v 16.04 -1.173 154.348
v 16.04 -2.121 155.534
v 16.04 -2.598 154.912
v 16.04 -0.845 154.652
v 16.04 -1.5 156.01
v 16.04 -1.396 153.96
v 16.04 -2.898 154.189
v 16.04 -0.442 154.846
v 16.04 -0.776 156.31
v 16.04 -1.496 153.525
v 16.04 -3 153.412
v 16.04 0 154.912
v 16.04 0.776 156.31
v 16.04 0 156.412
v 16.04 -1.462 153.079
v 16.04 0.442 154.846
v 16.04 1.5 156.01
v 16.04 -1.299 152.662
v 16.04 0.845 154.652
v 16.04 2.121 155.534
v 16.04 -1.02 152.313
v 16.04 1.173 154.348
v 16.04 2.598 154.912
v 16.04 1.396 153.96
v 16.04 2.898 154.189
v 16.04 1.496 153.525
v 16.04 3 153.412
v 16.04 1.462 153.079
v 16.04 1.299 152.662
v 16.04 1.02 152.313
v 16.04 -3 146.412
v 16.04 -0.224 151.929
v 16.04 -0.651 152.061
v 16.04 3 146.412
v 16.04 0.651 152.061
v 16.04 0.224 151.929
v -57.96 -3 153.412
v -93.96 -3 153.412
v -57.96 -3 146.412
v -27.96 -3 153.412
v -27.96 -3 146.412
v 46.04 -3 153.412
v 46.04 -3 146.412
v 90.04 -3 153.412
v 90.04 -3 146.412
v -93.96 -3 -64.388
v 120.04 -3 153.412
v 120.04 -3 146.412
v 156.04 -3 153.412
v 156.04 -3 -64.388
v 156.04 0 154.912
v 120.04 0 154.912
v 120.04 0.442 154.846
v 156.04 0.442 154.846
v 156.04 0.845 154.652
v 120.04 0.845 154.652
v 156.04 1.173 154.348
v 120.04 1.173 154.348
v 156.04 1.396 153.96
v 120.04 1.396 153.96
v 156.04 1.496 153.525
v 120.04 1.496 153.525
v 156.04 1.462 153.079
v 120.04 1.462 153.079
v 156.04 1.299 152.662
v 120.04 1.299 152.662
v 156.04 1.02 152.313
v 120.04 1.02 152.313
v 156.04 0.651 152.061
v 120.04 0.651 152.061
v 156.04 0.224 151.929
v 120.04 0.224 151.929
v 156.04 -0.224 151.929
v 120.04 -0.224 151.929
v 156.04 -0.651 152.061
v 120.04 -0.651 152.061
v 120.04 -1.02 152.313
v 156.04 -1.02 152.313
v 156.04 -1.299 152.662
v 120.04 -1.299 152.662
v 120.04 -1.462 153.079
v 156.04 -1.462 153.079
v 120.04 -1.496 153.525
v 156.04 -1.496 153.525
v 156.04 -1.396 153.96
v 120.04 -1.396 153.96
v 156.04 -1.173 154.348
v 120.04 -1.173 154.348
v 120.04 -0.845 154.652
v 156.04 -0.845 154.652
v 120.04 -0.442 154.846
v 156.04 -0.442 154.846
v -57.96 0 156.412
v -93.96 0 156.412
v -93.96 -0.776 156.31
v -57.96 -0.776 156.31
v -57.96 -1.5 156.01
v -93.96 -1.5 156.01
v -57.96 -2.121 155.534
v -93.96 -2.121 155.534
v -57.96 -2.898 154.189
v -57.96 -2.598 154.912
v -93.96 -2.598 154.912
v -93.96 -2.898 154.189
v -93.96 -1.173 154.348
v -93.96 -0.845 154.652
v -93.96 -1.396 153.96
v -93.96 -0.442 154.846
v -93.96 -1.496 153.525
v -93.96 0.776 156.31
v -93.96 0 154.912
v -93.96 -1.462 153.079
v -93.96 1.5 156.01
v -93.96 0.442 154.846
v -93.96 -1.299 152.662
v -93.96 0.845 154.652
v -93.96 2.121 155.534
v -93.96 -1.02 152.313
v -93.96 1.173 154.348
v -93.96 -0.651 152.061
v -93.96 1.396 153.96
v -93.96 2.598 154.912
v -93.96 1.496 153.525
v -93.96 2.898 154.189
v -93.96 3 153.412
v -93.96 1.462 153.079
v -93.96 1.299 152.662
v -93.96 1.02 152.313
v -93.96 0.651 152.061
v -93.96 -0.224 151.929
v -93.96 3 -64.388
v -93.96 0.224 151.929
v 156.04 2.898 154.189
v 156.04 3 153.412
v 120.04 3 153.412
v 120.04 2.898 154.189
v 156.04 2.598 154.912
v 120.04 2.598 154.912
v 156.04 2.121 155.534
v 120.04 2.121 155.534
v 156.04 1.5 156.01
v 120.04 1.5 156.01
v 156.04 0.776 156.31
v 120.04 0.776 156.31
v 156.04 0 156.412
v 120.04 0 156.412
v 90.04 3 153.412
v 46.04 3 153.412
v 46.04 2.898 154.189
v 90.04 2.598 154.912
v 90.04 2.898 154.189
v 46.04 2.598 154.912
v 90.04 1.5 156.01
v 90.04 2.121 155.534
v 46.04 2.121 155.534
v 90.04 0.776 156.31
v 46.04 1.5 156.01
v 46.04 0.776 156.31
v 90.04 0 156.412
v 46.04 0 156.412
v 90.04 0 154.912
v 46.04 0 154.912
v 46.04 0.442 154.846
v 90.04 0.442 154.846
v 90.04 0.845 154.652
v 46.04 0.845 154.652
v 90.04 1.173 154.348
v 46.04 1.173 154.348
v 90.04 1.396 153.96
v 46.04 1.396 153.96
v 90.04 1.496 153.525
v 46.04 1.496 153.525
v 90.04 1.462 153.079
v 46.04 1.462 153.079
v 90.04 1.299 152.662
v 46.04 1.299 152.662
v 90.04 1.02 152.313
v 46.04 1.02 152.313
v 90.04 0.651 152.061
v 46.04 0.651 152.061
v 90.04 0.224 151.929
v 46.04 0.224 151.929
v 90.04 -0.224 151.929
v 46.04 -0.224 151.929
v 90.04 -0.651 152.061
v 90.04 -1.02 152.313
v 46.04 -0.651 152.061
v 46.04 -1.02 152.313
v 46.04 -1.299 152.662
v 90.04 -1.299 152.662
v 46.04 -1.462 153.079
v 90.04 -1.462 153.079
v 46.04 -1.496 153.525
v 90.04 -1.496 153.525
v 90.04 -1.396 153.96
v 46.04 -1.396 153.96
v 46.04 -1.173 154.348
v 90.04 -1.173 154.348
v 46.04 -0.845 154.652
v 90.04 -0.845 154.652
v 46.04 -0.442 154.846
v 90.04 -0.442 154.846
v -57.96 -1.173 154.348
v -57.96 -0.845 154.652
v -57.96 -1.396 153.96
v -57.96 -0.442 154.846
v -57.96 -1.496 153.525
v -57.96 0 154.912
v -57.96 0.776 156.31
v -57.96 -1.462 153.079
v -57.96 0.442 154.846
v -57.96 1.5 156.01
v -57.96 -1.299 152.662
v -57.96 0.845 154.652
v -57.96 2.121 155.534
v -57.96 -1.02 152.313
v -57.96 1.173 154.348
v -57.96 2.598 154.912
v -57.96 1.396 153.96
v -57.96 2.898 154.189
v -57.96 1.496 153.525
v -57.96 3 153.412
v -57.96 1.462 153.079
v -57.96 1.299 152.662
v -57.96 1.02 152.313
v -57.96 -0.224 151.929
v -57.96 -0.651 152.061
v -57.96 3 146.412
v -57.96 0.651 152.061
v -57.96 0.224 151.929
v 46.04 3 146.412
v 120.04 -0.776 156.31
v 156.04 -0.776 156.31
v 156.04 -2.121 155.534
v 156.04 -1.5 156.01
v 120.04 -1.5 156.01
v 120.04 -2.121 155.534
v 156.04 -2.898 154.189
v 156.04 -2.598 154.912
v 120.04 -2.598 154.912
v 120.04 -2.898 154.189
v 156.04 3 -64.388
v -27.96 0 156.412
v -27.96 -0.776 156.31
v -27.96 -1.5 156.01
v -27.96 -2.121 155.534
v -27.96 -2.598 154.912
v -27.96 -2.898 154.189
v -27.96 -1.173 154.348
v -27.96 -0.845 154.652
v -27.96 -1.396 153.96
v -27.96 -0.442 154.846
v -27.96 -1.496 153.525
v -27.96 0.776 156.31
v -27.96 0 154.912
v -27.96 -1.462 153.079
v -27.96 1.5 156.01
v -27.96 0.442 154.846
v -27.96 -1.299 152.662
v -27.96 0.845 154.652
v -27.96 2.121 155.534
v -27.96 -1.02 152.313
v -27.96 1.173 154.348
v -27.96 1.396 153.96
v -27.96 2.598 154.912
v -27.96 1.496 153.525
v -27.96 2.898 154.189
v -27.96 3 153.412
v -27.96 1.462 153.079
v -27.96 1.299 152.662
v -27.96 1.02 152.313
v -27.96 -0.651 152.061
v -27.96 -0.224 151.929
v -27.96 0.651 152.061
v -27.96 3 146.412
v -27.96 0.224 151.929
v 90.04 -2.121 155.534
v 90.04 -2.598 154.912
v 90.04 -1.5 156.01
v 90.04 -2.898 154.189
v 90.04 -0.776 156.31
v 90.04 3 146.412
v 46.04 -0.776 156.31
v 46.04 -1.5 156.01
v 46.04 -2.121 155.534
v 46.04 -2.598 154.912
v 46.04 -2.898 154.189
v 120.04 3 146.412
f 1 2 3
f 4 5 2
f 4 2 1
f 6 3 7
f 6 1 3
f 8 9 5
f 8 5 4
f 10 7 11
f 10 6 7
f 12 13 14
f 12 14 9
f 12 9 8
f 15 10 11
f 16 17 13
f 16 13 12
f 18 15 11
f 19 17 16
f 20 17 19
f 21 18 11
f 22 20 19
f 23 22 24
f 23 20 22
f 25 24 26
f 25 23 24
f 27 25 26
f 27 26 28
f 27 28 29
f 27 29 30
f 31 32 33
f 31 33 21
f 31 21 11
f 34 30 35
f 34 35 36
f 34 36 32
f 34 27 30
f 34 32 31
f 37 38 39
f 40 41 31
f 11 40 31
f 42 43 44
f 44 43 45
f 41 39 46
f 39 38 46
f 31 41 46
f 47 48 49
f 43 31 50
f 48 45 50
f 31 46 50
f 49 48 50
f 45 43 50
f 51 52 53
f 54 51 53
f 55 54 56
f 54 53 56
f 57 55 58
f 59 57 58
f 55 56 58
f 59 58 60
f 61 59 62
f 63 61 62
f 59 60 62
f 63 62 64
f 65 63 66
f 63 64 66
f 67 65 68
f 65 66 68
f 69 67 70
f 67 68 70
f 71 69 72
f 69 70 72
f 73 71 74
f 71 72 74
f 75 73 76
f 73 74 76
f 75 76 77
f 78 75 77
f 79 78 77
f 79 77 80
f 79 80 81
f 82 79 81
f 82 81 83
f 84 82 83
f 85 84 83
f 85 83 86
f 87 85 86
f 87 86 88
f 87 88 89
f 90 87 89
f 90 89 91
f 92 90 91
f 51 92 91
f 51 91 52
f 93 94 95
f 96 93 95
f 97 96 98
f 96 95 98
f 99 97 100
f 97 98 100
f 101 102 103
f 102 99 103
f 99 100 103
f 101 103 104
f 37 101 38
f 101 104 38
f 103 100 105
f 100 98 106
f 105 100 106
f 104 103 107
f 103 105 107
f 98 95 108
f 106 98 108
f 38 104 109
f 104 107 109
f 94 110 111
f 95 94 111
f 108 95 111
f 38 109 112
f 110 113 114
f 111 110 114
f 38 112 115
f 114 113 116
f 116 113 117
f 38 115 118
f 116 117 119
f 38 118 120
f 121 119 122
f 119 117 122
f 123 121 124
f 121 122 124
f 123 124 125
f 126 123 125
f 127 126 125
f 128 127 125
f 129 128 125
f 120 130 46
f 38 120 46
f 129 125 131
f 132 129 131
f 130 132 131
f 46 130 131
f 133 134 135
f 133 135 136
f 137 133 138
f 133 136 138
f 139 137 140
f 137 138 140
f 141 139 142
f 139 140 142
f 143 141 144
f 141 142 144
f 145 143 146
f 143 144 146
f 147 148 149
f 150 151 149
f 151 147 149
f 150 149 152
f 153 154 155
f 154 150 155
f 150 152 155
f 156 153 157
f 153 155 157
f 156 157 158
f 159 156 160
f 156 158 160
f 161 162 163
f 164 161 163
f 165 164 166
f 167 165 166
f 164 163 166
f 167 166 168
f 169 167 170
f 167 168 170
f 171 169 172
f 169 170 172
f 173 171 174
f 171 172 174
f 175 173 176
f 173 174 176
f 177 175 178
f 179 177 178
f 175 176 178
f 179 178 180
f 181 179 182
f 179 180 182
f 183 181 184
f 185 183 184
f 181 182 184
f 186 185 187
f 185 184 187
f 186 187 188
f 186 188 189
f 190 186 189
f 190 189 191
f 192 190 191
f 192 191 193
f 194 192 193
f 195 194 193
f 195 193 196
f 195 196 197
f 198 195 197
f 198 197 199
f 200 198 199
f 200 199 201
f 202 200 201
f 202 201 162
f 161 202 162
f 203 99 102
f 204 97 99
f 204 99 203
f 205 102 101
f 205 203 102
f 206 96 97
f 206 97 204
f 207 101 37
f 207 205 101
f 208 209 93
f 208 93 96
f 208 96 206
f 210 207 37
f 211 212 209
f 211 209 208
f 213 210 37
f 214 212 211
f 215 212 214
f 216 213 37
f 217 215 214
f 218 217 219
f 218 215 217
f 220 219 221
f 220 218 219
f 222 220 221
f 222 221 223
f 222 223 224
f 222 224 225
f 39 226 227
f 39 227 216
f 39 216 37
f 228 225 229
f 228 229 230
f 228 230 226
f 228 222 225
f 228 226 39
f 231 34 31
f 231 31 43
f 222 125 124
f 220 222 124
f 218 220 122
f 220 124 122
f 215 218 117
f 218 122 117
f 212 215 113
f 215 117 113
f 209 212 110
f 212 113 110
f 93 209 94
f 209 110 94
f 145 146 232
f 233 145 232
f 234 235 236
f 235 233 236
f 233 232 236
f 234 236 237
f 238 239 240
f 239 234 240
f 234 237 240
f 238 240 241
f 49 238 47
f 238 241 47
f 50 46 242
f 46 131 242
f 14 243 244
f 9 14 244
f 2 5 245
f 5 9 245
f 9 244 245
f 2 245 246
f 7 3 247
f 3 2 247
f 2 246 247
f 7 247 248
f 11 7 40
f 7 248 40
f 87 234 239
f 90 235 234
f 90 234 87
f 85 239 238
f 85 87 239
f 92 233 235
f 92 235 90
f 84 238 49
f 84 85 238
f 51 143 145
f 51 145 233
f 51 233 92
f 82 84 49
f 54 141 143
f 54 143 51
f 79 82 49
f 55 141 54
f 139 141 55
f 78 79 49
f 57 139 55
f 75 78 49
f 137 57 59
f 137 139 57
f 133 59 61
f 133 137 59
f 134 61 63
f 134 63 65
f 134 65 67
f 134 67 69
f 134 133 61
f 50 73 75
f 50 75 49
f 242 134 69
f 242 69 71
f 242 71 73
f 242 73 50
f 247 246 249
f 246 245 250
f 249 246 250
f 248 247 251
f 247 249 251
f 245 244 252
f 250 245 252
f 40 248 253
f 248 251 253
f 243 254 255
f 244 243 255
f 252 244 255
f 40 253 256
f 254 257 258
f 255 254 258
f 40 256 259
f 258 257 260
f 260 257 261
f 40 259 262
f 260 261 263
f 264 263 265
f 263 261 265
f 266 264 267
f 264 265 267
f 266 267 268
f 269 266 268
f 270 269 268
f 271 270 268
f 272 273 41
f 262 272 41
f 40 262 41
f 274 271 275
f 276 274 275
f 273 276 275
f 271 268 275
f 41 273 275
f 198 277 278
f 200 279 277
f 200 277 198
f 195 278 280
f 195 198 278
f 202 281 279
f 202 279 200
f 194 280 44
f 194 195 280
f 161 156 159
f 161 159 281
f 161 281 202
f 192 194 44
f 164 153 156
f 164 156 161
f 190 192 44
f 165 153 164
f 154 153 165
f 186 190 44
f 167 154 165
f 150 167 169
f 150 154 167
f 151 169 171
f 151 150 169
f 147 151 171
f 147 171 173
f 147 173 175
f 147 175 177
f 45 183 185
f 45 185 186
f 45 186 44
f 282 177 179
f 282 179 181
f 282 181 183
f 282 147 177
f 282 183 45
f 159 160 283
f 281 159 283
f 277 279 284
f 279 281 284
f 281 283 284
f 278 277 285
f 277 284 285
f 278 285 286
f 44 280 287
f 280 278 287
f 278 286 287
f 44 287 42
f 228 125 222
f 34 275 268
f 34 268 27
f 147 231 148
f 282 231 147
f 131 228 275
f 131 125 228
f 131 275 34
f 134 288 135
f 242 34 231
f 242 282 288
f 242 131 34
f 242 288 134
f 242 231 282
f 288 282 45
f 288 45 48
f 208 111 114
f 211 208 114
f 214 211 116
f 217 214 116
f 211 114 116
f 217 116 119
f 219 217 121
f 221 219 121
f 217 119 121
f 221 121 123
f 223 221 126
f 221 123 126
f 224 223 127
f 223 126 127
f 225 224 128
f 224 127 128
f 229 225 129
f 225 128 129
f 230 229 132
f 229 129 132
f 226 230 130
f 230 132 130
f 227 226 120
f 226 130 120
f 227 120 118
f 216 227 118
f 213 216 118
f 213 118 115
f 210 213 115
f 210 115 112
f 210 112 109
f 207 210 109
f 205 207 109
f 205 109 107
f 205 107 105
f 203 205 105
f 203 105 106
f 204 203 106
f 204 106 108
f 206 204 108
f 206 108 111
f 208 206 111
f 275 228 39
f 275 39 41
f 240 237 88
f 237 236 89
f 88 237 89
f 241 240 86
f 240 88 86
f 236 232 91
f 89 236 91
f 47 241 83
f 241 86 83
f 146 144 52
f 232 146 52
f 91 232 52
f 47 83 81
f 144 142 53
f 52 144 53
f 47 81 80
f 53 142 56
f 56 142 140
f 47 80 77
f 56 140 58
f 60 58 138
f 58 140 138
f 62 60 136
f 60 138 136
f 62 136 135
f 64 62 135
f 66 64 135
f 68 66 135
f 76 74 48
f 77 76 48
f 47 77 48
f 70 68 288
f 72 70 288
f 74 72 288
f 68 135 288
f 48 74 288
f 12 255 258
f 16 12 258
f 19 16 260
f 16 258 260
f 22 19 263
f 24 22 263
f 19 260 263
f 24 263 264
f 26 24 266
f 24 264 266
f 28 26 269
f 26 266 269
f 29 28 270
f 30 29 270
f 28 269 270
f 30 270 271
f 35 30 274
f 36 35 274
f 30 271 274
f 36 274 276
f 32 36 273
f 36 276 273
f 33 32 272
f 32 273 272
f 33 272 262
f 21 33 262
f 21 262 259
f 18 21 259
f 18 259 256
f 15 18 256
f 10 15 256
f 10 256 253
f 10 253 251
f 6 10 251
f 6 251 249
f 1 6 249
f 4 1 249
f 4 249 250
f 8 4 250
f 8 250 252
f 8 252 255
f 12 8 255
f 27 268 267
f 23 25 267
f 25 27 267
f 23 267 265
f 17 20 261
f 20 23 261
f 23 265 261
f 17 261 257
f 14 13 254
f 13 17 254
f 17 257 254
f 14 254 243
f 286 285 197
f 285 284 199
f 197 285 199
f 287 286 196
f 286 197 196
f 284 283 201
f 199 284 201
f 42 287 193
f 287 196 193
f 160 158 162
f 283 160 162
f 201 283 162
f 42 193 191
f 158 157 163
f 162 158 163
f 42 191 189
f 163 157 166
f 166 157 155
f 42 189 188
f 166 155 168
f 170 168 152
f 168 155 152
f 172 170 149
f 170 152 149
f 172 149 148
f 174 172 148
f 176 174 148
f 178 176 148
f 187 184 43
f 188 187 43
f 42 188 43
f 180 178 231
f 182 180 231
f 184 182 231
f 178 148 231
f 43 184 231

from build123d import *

# Parameters (mm, degrees)
SKETCH_1_W          = 250
SKETCH_1_H          = 220.8
EXTRUDE_1_DEPTH     = 3
CUT_EXTRUDE_1_REACH = 223.019
SKETCH_2_W          = 30
SKETCH_2_H          = 10
SKETCH_3_R          = 1.5
CUT_EXTRUDE_2_DEPTH = 295.913282021


with BuildPart() as part:
    # 草图1 → 凸台-拉伸1 (new, symmetric)
    with BuildSketch(Plane(origin=(0, 0, 0), x_dir=(1, 0, 0), z_dir=(0, 1, 0))):
        with Locations((31.040268456, -46.012416107)):
            Rectangle(SKETCH_1_W, SKETCH_1_H)
    extrude(amount=EXTRUDE_1_DEPTH, both=True)

    # 草图2 → 切除-拉伸1 (cut, up to next)
    with BuildSketch(Plane(origin=(0, 3, 0), x_dir=(1, 0, 0), z_dir=(0, 1, 0)), mode=Mode.PRIVATE) as cut_extrude_1_sk1:
        with Locations((-42.959731544, -151.412416107)):
            Rectangle(SKETCH_2_W, SKETCH_2_H)
    cut_extrude_1_tool1 = extrude(cut_extrude_1_sk1.sketch, amount=-CUT_EXTRUDE_1_REACH, mode=Mode.PRIVATE) & part.part
    # 草图2 → 切除-拉伸1 (cut, up to next)
    with BuildSketch(Plane(origin=(0, 3, 0), x_dir=(1, 0, 0), z_dir=(0, 1, 0)), mode=Mode.PRIVATE) as cut_extrude_1_sk2:
        with Locations((31.040268456, -151.412416107)):
            Rectangle(SKETCH_2_W, SKETCH_2_H)
    cut_extrude_1_tool2 = extrude(cut_extrude_1_sk2.sketch, amount=-CUT_EXTRUDE_1_REACH, mode=Mode.PRIVATE) & part.part
    # 草图2 → 切除-拉伸1 (cut, up to next)
    with BuildSketch(Plane(origin=(0, 3, 0), x_dir=(1, 0, 0), z_dir=(0, 1, 0)), mode=Mode.PRIVATE) as cut_extrude_1_sk3:
        with Locations((105.040268456, -151.412416107)):
            Rectangle(SKETCH_2_W, SKETCH_2_H)
    cut_extrude_1_tool3 = extrude(cut_extrude_1_sk3.sketch, amount=-CUT_EXTRUDE_1_REACH, mode=Mode.PRIVATE) & part.part
    add(cut_extrude_1_tool1.solids().sort_by_distance((-42.959732, 3, 151.412416))[0], mode=Mode.SUBTRACT)
    add(cut_extrude_1_tool2.solids().sort_by_distance((31.040268, 3, 151.412416))[0], mode=Mode.SUBTRACT)
    add(cut_extrude_1_tool3.solids().sort_by_distance((105.040268, 3, 151.412416))[0], mode=Mode.SUBTRACT)

    # 草图3 → 切除-拉伸2 (cut, through all)
    with BuildSketch(Plane.ZY.offset(93.959731544)):
        with Locations((153.412416107, 0)):
            Circle(SKETCH_3_R)
        with BuildLine():
            Line((156.412416107, 3), (153.412416107, 3))
            ThreePointArc((153.412416107, 3), (155.533736451, 2.121320344), (156.412416107, 0))
            Line((156.412416107, 0), (156.412416107, 3))
        make_face()
        with BuildLine():
            Line((156.412416107, -3), (156.412416107, 0))
            ThreePointArc((156.412416107, 0), (155.533736451, -2.121320344), (153.412416107, -3))
            Line((153.412416107, -3), (156.412416107, -3))
        make_face()
    extrude(amount=-CUT_EXTRUDE_2_DEPTH, mode=Mode.SUBTRACT)


solid = part.part
